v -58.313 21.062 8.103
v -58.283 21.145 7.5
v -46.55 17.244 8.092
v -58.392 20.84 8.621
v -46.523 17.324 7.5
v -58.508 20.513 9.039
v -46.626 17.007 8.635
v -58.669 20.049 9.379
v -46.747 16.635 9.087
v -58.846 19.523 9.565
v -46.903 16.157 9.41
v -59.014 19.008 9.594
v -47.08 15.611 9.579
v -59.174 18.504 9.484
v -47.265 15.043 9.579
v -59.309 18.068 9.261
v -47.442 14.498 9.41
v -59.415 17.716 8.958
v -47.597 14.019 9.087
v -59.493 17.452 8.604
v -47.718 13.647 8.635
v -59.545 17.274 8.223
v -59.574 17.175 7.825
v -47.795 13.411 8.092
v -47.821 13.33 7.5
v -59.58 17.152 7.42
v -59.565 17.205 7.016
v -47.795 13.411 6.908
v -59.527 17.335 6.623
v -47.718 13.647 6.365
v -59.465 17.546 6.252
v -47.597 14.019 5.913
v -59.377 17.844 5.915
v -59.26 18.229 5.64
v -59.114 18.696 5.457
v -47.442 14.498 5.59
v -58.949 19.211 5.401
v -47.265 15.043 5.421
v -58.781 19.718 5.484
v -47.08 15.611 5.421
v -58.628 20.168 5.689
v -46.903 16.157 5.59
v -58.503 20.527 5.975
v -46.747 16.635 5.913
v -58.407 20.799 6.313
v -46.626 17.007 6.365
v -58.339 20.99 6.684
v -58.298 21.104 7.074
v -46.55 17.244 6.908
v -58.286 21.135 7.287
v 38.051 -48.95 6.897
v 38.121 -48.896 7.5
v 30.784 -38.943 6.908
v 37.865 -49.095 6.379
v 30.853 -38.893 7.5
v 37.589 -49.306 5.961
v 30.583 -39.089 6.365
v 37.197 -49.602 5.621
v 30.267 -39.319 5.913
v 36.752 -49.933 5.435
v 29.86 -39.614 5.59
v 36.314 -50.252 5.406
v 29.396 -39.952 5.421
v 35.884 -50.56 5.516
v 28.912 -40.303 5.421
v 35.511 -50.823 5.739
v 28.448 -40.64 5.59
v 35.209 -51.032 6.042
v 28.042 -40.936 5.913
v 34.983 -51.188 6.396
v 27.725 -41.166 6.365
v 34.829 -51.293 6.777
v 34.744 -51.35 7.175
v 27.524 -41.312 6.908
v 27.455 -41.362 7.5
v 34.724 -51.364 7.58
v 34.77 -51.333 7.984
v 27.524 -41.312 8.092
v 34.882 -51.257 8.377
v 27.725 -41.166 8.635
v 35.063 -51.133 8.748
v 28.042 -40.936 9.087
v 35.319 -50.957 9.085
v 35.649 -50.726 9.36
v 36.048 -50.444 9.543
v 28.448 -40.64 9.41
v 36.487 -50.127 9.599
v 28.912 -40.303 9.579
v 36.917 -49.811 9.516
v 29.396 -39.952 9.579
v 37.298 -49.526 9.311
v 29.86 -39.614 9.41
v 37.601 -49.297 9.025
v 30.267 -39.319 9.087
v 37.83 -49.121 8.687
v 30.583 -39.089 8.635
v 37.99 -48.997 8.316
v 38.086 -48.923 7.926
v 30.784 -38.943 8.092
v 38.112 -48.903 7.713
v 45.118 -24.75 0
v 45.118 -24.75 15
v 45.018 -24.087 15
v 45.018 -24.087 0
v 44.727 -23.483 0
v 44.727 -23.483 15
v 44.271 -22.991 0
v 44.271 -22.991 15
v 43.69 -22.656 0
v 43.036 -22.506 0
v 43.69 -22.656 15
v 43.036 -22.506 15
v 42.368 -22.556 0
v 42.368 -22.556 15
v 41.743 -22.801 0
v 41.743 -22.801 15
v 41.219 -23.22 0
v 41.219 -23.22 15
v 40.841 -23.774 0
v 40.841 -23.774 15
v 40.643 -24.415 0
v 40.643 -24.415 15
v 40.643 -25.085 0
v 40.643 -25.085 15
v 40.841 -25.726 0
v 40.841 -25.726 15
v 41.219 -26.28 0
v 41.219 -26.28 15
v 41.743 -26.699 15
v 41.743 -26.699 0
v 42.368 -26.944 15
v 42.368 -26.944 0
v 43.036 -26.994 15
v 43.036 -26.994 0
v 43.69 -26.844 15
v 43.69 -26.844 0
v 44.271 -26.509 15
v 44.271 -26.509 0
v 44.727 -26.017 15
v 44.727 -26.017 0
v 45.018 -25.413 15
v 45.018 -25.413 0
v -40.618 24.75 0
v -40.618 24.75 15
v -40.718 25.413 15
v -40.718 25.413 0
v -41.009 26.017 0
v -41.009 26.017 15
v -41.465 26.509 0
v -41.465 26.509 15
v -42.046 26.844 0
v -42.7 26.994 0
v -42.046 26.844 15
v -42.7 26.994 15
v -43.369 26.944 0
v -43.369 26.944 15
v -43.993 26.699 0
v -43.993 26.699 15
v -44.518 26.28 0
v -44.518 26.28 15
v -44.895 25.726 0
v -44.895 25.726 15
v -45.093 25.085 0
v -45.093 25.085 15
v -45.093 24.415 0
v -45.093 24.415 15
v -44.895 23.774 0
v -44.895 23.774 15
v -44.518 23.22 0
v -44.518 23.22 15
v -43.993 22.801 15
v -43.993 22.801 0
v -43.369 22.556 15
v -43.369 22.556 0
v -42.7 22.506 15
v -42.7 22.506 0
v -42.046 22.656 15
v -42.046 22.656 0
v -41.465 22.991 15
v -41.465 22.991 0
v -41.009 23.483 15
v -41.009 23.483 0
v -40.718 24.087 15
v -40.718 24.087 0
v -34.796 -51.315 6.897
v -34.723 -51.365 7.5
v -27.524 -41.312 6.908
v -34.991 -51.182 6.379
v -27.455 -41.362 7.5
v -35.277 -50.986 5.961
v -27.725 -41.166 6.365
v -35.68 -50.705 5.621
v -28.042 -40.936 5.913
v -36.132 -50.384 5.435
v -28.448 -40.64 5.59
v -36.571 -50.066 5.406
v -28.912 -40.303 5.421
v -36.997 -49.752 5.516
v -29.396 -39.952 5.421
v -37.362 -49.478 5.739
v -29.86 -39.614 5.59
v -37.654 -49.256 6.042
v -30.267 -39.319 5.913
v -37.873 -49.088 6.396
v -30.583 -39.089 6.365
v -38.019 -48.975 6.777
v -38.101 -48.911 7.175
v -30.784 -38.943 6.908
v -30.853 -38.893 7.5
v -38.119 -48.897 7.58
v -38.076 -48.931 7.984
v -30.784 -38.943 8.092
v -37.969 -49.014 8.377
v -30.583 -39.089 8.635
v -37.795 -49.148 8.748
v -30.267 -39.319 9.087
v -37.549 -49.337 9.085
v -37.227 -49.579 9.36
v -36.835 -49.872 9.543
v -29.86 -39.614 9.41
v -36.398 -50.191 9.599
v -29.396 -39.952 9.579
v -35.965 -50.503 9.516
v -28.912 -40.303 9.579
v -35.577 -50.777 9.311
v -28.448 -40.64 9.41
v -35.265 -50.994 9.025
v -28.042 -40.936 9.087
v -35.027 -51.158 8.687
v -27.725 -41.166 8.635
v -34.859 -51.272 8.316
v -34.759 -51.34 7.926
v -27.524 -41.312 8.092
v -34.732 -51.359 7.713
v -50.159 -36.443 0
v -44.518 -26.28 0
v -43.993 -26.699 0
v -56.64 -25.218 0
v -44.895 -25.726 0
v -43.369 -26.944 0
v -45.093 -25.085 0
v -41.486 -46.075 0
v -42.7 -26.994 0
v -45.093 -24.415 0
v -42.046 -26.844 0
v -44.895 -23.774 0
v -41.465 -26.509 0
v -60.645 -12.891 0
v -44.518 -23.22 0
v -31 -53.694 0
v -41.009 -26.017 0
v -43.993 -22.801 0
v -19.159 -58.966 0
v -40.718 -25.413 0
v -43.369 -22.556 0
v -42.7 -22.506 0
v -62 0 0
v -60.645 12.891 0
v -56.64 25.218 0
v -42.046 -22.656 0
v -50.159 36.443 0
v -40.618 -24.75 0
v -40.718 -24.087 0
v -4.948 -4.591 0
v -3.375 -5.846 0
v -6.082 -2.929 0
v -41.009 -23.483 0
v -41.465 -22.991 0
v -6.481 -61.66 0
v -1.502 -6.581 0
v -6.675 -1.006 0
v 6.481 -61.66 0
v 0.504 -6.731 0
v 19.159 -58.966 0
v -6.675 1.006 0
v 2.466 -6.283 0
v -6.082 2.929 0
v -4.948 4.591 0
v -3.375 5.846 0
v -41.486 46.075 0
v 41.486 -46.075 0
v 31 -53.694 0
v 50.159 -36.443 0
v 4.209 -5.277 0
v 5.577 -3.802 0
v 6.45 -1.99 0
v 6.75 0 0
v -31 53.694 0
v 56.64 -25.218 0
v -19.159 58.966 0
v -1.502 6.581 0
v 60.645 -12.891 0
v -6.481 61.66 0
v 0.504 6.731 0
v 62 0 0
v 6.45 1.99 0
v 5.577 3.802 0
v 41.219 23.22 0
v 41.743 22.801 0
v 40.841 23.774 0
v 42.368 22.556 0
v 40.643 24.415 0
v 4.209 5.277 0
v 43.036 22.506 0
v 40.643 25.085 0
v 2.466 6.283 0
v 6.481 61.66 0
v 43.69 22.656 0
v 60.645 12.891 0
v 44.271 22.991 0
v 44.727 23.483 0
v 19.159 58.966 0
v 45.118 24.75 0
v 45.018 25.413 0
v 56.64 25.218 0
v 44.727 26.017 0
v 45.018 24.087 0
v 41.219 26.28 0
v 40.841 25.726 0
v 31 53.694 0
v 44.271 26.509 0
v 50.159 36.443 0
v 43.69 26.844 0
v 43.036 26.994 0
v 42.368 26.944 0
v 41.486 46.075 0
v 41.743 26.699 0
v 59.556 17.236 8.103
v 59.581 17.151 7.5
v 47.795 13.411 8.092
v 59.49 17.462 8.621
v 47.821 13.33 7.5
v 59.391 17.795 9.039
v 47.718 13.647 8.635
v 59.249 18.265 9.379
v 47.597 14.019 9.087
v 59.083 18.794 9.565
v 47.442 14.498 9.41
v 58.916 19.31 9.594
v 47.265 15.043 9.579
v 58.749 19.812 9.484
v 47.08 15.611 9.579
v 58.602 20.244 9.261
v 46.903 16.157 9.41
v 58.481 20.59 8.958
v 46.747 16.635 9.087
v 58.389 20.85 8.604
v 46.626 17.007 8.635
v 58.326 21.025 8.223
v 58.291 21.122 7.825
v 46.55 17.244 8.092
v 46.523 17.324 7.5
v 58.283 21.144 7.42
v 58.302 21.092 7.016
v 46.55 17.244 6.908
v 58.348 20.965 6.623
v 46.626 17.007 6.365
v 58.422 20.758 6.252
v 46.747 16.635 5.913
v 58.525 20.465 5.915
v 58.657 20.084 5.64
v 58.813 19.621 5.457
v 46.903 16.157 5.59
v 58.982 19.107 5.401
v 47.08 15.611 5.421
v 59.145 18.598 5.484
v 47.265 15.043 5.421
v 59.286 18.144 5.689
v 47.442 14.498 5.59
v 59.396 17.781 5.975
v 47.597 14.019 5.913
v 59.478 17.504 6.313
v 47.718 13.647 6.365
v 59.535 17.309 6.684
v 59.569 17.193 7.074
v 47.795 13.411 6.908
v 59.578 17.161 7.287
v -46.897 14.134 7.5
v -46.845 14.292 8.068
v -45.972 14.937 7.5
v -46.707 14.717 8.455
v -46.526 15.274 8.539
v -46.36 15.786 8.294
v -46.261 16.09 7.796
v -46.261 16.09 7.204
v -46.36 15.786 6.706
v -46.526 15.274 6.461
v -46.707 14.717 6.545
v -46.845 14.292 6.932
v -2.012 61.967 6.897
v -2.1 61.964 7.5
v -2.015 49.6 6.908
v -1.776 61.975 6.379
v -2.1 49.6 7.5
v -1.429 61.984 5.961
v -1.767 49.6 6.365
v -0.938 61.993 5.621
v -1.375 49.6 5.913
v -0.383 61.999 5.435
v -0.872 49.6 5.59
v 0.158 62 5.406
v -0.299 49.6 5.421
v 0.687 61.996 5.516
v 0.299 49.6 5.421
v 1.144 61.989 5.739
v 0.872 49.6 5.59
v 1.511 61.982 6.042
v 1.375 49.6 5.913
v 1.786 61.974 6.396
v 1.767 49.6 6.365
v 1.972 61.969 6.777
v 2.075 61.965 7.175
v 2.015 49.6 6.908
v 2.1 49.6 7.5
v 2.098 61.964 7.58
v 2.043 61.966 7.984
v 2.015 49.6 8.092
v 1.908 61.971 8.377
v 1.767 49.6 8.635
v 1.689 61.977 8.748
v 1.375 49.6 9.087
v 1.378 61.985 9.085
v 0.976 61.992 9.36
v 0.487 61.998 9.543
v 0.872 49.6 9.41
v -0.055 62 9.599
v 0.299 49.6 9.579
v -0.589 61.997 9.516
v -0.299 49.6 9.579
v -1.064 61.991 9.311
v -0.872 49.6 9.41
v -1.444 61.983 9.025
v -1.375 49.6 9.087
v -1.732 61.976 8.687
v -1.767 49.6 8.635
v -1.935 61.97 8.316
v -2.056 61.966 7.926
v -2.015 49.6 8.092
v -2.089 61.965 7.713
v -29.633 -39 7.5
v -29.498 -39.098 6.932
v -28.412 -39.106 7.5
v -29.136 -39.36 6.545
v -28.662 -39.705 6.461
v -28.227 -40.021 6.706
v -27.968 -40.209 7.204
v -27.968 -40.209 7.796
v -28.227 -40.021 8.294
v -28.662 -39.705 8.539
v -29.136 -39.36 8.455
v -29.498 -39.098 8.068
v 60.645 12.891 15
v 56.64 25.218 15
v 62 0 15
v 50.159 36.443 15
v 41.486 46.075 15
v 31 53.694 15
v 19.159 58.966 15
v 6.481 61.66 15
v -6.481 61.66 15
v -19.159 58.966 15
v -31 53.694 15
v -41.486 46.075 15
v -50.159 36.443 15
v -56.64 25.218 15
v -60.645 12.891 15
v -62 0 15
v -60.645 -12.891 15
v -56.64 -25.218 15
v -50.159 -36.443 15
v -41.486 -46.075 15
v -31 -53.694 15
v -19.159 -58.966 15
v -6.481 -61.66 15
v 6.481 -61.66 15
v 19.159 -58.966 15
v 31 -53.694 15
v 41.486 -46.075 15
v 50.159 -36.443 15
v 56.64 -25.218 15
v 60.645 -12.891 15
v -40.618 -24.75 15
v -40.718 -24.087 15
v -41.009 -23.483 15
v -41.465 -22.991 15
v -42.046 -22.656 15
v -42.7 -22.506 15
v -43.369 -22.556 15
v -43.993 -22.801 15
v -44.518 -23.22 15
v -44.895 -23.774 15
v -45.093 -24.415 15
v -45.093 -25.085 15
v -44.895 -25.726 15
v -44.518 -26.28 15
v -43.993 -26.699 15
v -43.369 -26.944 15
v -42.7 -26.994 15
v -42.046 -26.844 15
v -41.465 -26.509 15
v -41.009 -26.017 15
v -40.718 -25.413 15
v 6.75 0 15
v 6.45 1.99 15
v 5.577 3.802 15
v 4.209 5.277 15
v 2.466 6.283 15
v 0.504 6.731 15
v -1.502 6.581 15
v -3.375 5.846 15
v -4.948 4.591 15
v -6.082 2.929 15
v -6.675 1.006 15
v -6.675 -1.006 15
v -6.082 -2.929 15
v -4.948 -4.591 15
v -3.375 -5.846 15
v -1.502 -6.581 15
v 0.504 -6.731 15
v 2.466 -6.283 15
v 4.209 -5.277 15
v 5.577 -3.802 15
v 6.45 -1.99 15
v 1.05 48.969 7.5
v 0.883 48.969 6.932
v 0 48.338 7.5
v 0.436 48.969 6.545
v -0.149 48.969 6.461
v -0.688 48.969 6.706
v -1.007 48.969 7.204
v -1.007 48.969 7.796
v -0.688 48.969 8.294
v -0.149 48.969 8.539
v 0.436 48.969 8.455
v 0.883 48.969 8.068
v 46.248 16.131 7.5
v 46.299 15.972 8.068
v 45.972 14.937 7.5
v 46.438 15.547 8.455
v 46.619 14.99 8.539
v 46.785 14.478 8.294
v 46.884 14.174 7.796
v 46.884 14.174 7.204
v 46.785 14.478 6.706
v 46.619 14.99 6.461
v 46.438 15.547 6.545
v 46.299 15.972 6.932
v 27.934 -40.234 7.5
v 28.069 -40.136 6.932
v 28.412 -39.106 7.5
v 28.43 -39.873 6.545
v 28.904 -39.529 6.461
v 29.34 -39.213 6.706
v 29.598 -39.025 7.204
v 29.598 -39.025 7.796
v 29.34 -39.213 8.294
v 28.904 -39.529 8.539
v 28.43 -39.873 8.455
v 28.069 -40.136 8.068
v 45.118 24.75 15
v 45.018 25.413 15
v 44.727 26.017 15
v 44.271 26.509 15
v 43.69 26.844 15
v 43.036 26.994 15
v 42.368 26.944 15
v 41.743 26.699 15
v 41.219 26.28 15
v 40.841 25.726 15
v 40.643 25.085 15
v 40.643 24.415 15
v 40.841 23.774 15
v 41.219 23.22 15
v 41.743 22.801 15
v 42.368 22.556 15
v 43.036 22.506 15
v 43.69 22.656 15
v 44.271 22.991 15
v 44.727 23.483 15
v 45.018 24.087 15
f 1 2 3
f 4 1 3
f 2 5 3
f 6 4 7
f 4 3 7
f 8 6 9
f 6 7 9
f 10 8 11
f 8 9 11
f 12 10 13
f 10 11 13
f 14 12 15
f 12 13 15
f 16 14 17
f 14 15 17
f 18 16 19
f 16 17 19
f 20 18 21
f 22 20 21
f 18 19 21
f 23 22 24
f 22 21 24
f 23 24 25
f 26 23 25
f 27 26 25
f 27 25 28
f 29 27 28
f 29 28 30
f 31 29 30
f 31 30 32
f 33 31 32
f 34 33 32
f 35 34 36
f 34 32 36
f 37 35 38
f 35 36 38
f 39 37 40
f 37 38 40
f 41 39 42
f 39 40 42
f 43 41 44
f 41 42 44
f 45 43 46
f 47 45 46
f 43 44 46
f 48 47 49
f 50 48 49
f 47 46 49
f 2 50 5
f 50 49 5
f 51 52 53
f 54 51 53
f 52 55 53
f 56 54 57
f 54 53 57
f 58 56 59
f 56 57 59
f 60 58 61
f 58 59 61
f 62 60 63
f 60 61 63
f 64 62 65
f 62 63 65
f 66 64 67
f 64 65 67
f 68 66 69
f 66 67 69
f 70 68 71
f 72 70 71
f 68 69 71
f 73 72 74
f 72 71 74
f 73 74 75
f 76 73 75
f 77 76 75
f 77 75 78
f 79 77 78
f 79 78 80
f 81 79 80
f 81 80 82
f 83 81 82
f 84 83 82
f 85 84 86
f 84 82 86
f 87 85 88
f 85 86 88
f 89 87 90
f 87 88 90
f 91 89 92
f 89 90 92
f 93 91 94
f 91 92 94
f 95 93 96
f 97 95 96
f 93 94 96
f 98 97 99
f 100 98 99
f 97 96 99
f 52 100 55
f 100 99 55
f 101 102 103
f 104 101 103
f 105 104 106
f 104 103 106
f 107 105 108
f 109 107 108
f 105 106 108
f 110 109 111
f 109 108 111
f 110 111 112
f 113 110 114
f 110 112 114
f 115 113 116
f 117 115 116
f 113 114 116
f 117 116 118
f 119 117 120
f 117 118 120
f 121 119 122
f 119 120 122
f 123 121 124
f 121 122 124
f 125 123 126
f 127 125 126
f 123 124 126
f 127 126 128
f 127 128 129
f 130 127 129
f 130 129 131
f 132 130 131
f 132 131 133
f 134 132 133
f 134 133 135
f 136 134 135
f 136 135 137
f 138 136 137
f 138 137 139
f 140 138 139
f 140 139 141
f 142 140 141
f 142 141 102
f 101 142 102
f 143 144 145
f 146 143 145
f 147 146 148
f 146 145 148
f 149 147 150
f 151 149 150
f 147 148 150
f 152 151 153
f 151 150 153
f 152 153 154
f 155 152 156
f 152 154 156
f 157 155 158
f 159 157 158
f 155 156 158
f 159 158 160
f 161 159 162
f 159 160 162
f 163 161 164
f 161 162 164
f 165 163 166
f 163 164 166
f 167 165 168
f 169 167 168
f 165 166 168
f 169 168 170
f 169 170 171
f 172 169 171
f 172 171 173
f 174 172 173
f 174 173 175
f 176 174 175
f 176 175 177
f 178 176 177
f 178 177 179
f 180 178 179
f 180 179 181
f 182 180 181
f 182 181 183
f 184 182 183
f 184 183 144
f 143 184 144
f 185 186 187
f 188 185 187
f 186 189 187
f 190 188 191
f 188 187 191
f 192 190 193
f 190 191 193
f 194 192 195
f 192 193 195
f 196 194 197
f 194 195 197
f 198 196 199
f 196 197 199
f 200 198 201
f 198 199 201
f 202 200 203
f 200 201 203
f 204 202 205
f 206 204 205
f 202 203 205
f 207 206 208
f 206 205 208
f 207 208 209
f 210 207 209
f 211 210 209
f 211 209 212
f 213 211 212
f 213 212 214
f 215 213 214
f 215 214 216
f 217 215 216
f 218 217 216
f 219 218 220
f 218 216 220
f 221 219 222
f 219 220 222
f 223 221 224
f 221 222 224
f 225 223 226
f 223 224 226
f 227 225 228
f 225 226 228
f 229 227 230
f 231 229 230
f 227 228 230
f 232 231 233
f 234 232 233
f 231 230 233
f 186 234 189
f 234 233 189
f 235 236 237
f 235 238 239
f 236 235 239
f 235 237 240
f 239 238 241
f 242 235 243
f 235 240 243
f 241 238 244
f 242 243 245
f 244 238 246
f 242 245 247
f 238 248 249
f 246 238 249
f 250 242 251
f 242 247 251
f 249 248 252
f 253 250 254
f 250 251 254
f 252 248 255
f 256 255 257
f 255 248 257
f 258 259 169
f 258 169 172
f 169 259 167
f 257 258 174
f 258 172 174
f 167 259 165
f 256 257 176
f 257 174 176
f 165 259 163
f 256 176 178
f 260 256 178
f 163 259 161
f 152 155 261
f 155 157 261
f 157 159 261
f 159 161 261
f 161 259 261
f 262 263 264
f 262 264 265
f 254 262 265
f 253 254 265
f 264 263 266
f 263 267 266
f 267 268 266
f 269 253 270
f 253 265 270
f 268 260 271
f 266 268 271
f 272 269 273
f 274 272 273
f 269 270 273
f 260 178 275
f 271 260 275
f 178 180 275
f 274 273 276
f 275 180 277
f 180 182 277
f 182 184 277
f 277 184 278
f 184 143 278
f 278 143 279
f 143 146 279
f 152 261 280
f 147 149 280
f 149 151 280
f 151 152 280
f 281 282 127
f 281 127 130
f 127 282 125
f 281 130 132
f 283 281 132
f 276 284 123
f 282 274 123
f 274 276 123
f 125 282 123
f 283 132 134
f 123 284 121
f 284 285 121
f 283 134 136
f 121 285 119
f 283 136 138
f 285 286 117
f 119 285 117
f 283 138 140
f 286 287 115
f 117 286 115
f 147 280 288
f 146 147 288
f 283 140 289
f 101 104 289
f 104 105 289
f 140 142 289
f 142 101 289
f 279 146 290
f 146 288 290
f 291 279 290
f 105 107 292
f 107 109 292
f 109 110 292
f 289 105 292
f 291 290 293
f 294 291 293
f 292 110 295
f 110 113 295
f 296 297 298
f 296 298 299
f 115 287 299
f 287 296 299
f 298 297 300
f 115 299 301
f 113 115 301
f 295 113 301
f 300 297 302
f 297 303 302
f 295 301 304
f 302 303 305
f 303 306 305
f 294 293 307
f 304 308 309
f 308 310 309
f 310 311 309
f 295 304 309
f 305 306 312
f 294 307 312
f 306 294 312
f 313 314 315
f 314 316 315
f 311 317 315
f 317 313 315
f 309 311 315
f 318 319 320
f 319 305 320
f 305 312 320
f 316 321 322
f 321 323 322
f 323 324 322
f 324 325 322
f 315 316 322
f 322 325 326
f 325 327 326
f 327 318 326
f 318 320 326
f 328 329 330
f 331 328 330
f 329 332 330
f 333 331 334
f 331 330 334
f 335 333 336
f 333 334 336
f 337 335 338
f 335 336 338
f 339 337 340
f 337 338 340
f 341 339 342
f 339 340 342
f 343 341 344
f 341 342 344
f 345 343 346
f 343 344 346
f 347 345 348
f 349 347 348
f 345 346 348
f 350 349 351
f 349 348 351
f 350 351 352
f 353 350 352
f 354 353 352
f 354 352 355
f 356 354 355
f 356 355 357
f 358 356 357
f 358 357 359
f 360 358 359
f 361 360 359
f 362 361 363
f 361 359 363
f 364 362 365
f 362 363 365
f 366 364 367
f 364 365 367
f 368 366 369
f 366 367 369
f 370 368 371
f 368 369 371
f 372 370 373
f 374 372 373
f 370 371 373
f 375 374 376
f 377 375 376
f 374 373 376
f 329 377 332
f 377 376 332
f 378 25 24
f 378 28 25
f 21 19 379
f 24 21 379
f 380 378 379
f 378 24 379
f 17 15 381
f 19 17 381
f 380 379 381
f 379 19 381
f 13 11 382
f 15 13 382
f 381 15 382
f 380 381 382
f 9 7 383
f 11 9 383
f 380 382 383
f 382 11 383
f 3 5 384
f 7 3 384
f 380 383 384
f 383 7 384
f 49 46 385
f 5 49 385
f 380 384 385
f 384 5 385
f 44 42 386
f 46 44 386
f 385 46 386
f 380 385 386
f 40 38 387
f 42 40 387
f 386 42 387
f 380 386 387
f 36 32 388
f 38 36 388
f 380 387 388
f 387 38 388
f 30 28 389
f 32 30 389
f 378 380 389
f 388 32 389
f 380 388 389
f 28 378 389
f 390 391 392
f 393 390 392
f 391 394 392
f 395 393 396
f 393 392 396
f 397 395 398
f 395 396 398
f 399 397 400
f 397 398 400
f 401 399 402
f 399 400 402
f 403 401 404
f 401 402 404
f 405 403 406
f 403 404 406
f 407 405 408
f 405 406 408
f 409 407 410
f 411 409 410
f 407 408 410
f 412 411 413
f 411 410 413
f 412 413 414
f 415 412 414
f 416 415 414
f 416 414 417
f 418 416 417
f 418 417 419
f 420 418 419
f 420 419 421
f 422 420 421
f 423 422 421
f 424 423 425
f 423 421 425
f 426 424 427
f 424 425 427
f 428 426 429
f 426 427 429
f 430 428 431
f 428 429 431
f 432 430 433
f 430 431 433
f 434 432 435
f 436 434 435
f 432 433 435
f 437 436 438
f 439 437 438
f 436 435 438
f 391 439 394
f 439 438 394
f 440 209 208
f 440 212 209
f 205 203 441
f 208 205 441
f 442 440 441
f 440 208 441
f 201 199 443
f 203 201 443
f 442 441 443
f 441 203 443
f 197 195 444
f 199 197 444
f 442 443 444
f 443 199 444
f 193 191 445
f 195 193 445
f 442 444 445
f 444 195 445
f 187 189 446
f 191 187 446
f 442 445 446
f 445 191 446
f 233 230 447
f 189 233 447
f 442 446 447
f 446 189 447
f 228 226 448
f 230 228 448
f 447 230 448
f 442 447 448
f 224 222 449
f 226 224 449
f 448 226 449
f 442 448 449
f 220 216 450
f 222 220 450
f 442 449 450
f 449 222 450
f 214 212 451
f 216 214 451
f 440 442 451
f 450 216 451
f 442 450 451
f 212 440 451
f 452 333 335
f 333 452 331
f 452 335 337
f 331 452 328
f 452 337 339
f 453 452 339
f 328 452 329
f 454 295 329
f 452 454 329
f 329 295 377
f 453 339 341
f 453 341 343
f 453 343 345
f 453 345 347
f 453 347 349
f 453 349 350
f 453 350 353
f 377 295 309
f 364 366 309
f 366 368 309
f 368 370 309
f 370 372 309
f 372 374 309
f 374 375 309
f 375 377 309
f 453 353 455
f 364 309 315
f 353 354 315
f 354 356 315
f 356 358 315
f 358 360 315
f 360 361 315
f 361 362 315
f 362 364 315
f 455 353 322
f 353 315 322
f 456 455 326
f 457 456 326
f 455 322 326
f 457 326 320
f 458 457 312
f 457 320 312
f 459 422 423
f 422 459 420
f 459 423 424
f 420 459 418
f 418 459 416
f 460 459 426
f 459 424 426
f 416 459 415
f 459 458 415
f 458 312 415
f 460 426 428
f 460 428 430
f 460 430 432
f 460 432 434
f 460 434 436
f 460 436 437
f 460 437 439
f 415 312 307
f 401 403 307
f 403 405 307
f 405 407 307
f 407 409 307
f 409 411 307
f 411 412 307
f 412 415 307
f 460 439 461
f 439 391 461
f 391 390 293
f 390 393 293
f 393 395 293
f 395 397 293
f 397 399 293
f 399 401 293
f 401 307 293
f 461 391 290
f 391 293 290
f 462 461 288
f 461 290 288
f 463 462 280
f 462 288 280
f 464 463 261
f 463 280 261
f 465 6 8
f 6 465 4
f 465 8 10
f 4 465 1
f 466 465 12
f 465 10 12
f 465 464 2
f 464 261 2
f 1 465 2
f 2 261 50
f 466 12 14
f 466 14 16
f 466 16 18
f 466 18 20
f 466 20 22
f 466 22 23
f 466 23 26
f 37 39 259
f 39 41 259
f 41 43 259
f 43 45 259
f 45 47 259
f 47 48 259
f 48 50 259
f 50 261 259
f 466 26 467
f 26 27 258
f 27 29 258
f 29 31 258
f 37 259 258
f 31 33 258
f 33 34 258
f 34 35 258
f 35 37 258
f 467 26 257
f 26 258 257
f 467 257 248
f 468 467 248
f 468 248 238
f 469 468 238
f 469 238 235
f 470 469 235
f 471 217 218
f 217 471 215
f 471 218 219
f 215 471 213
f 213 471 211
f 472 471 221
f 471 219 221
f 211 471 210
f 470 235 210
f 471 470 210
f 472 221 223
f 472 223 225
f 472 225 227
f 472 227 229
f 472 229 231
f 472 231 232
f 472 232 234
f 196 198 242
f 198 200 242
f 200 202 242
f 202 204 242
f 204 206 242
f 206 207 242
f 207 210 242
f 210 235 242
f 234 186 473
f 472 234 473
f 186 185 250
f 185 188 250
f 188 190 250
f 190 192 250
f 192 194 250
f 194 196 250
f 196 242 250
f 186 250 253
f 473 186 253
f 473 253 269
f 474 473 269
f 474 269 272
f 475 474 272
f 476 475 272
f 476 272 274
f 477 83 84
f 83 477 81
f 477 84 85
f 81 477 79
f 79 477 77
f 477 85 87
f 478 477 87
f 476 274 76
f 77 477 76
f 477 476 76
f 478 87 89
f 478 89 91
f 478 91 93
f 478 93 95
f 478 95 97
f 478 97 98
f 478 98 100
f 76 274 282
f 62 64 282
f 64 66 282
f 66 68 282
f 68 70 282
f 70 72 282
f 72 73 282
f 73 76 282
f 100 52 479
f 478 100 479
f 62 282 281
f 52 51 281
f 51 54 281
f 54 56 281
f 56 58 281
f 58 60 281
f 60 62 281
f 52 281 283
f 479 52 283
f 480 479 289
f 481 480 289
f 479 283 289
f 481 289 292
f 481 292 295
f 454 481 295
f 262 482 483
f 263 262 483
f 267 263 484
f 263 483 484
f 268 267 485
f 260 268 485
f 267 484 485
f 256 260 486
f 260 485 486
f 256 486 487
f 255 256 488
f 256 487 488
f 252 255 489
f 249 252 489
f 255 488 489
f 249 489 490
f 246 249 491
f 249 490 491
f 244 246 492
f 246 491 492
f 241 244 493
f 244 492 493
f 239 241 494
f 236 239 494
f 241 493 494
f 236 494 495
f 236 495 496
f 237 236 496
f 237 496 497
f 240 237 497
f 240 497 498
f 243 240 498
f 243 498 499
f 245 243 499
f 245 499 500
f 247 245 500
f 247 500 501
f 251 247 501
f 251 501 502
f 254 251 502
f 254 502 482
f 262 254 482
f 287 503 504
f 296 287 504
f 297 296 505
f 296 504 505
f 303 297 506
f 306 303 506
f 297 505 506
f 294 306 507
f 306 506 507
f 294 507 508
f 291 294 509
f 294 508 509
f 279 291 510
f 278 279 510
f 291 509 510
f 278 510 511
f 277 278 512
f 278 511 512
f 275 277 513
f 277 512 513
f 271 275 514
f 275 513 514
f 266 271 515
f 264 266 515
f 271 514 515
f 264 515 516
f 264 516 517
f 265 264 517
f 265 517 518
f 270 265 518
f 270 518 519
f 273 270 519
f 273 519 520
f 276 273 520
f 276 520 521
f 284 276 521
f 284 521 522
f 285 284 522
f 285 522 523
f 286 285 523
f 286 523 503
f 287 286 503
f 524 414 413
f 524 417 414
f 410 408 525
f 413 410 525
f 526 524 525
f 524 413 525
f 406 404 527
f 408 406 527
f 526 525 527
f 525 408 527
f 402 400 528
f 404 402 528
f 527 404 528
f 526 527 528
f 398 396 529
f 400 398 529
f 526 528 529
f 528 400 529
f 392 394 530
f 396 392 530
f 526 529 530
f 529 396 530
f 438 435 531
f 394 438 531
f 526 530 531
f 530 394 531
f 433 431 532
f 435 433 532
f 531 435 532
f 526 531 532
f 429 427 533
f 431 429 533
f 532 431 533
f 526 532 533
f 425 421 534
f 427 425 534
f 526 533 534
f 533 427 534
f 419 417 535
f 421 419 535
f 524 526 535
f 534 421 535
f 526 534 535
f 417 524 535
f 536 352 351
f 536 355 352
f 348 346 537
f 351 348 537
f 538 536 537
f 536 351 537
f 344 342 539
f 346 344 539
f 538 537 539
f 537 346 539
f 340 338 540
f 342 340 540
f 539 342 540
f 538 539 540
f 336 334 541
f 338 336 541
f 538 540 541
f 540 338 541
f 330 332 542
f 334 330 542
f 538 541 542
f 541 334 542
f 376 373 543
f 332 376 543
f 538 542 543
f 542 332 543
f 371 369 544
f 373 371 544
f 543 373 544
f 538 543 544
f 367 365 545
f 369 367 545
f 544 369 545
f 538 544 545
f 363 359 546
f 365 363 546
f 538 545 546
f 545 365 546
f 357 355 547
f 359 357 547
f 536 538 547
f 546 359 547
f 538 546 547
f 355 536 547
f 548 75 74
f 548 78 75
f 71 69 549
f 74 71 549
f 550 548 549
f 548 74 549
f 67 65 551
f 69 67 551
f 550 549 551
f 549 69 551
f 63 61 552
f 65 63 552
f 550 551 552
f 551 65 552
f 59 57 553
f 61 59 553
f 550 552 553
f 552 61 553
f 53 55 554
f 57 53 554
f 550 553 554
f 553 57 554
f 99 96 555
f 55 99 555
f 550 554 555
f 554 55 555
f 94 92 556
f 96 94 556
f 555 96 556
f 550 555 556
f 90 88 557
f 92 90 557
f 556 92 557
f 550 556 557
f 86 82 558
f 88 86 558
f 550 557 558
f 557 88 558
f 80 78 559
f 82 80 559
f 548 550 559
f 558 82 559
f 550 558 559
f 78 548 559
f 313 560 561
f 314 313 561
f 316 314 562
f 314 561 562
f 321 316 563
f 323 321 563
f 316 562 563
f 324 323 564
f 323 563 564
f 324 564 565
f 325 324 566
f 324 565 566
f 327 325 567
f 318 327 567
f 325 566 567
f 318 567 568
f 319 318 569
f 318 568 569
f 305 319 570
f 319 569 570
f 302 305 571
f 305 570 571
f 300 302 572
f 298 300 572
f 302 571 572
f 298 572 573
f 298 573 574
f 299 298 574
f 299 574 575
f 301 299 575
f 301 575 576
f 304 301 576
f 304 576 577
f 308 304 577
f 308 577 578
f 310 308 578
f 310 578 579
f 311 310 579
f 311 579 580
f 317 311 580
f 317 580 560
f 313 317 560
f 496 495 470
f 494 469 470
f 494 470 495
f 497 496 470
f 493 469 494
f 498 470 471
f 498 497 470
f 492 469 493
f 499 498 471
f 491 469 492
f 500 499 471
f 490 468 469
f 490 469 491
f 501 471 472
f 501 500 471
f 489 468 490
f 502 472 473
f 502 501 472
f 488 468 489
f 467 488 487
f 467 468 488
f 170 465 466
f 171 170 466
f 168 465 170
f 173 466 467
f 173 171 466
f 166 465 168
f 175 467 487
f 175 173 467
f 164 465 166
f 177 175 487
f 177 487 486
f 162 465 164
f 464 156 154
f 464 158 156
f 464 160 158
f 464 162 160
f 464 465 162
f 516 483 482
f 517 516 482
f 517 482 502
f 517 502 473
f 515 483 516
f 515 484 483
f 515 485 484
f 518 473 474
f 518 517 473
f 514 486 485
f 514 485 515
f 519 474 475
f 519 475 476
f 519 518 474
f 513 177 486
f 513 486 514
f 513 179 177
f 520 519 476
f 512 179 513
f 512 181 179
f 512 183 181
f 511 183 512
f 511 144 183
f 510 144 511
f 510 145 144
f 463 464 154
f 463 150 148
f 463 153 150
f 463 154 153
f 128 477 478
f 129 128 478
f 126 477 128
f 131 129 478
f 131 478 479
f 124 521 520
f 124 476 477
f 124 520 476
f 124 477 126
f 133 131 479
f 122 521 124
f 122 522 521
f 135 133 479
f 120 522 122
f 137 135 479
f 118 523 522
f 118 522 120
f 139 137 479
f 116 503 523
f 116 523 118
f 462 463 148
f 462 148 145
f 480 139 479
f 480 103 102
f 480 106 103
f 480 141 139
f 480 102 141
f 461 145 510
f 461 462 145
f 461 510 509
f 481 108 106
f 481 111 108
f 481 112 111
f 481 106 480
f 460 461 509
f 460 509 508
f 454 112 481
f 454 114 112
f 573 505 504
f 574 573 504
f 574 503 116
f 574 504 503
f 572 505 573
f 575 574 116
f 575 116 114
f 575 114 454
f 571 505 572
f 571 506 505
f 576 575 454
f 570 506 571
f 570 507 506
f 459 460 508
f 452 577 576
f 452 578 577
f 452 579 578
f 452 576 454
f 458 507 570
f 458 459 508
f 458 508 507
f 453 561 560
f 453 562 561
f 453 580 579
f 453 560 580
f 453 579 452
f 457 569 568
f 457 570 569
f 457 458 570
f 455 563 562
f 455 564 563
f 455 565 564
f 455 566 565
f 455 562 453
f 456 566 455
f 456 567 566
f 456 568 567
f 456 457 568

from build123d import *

# Parameters (mm, degrees)
SKETCH1_R                       = 62
BOSS_EXTRUDE1_DEPTH             = 15
M4_CLEARANCE_HOLE1_D            = 4.5
M12_CLEARANCE_HOLE1_D           = 13.5
M5_TAPPED_HOLE1_D               = 4.2
M5_TAPPED_HOLE1_DEPTH           = 12.4
M5_TAPPED_HOLE1_TIP             = 1.2618073
M5_TAPPED_HOLE1_ON_FACE_2_D     = 4.2
M5_TAPPED_HOLE1_ON_FACE_2_DEPTH = 12.4
M5_TAPPED_HOLE1_ON_FACE_2_TIP   = 1.2618073
M5_TAPPED_HOLE1_ON_FACE_3_D     = 4.2
M5_TAPPED_HOLE1_ON_FACE_3_DEPTH = 12.4
M5_TAPPED_HOLE1_ON_FACE_3_TIP   = 1.2618073
M5_TAPPED_HOLE1_ON_FACE_4_D     = 4.2
M5_TAPPED_HOLE1_ON_FACE_4_DEPTH = 12.4
M5_TAPPED_HOLE1_ON_FACE_4_TIP   = 1.2618073
M5_TAPPED_HOLE1_ON_FACE_5_D     = 4.2
M5_TAPPED_HOLE1_ON_FACE_5_DEPTH = 12.4
M5_TAPPED_HOLE1_ON_FACE_5_TIP   = 1.2618073


with BuildPart() as part:
    # Sketch1 → Boss-Extrude1 (new body)
    with BuildSketch(Plane.XY):
        Circle(SKETCH1_R)
    extrude(amount=BOSS_EXTRUDE1_DEPTH)

    # M4 Clearance Hole1 (through all)
    with Locations(Plane(origin=(0, 0, 0), x_dir=(-1, 0, 0), z_dir=(0, 0, -1))):
        with Locations((-42.868257487, 24.75), (-42.868257487, -24.75), (42.868257487, -24.75), (42.868257487, 24.75)):
            Hole(M4_CLEARANCE_HOLE1_D / 2)

    # M12 Clearance Hole1 (through all)
    with Locations(Plane(origin=(0, 0, 0), x_dir=(-1, 0, 0), z_dir=(0, 0, -1))):
        with Locations((0, 0)):
            Hole(M12_CLEARANCE_HOLE1_D / 2)

    # M5 Tapped Hole1
    with Locations(Plane(origin=(0, 62, 7.5), x_dir=(1, 0, 0), z_dir=(0, 1, 0))):
        with Locations((0, 0)):
            Hole(M5_TAPPED_HOLE1_D / 2, depth=M5_TAPPED_HOLE1_DEPTH)
            with Locations((0, 0, -(M5_TAPPED_HOLE1_DEPTH + M5_TAPPED_HOLE1_TIP / 2))):  # 118° drill point
                Cone(0, M5_TAPPED_HOLE1_D / 2, M5_TAPPED_HOLE1_TIP, mode=Mode.SUBTRACT)

    # M5 Tapped Hole1 on face 2
    with Locations(Plane(origin=(58.96550401, 19.159053651, 7.5), x_dir=(-0.309016857306, 0.951056560832, 0), z_dir=(0.951056560832, 0.309016857306, 0))):
        with Locations((0, 0)):
            Hole(M5_TAPPED_HOLE1_ON_FACE_2_D / 2, depth=M5_TAPPED_HOLE1_ON_FACE_2_DEPTH)
            with Locations((0, 0, -(M5_TAPPED_HOLE1_ON_FACE_2_DEPTH + M5_TAPPED_HOLE1_ON_FACE_2_TIP / 2))):  # 118° drill point
                Cone(0, M5_TAPPED_HOLE1_ON_FACE_2_D / 2, M5_TAPPED_HOLE1_ON_FACE_2_TIP, mode=Mode.SUBTRACT)

    # M5 Tapped Hole1 on face 3
    with Locations(Plane(origin=(36.442685642, -50.159053651, 7.5), x_dir=(-0.809017116291, -0.58778508449, 0), z_dir=(0.58778508449, -0.809017116291, 0))):
        with Locations((0, 0)):
            Hole(M5_TAPPED_HOLE1_ON_FACE_3_D / 2, depth=M5_TAPPED_HOLE1_ON_FACE_3_DEPTH)
            with Locations((0, 0, -(M5_TAPPED_HOLE1_ON_FACE_3_DEPTH + M5_TAPPED_HOLE1_ON_FACE_3_TIP / 2))):  # 118° drill point
                Cone(0, M5_TAPPED_HOLE1_ON_FACE_3_D / 2, M5_TAPPED_HOLE1_ON_FACE_3_TIP, mode=Mode.SUBTRACT)

    # M5 Tapped Hole1 on face 4
    with Locations(Plane(origin=(-36.442685642, -50.159053651, 7.5), x_dir=(-0.809017116291, 0.58778508449, 0), z_dir=(-0.58778508449, -0.809017116291, 0))):
        with Locations((0, 0)):
            Hole(M5_TAPPED_HOLE1_ON_FACE_4_D / 2, depth=M5_TAPPED_HOLE1_ON_FACE_4_DEPTH)
            with Locations((0, 0, -(M5_TAPPED_HOLE1_ON_FACE_4_DEPTH + M5_TAPPED_HOLE1_ON_FACE_4_TIP / 2))):  # 118° drill point
                Cone(0, M5_TAPPED_HOLE1_ON_FACE_4_D / 2, M5_TAPPED_HOLE1_ON_FACE_4_TIP, mode=Mode.SUBTRACT)

    # M5 Tapped Hole1 on face 5
    with Locations(Plane(origin=(-58.96550401, 19.159053651, 7.5), x_dir=(-0.309016857306, -0.951056560832, 0), z_dir=(-0.951056560832, 0.309016857306, 0))):
        with Locations((0, 0)):
            Hole(M5_TAPPED_HOLE1_ON_FACE_5_D / 2, depth=M5_TAPPED_HOLE1_ON_FACE_5_DEPTH)
            with Locations((0, 0, -(M5_TAPPED_HOLE1_ON_FACE_5_DEPTH + M5_TAPPED_HOLE1_ON_FACE_5_TIP / 2))):  # 118° drill point
                Cone(0, M5_TAPPED_HOLE1_ON_FACE_5_D / 2, M5_TAPPED_HOLE1_ON_FACE_5_TIP, mode=Mode.SUBTRACT)


solid = part.part
